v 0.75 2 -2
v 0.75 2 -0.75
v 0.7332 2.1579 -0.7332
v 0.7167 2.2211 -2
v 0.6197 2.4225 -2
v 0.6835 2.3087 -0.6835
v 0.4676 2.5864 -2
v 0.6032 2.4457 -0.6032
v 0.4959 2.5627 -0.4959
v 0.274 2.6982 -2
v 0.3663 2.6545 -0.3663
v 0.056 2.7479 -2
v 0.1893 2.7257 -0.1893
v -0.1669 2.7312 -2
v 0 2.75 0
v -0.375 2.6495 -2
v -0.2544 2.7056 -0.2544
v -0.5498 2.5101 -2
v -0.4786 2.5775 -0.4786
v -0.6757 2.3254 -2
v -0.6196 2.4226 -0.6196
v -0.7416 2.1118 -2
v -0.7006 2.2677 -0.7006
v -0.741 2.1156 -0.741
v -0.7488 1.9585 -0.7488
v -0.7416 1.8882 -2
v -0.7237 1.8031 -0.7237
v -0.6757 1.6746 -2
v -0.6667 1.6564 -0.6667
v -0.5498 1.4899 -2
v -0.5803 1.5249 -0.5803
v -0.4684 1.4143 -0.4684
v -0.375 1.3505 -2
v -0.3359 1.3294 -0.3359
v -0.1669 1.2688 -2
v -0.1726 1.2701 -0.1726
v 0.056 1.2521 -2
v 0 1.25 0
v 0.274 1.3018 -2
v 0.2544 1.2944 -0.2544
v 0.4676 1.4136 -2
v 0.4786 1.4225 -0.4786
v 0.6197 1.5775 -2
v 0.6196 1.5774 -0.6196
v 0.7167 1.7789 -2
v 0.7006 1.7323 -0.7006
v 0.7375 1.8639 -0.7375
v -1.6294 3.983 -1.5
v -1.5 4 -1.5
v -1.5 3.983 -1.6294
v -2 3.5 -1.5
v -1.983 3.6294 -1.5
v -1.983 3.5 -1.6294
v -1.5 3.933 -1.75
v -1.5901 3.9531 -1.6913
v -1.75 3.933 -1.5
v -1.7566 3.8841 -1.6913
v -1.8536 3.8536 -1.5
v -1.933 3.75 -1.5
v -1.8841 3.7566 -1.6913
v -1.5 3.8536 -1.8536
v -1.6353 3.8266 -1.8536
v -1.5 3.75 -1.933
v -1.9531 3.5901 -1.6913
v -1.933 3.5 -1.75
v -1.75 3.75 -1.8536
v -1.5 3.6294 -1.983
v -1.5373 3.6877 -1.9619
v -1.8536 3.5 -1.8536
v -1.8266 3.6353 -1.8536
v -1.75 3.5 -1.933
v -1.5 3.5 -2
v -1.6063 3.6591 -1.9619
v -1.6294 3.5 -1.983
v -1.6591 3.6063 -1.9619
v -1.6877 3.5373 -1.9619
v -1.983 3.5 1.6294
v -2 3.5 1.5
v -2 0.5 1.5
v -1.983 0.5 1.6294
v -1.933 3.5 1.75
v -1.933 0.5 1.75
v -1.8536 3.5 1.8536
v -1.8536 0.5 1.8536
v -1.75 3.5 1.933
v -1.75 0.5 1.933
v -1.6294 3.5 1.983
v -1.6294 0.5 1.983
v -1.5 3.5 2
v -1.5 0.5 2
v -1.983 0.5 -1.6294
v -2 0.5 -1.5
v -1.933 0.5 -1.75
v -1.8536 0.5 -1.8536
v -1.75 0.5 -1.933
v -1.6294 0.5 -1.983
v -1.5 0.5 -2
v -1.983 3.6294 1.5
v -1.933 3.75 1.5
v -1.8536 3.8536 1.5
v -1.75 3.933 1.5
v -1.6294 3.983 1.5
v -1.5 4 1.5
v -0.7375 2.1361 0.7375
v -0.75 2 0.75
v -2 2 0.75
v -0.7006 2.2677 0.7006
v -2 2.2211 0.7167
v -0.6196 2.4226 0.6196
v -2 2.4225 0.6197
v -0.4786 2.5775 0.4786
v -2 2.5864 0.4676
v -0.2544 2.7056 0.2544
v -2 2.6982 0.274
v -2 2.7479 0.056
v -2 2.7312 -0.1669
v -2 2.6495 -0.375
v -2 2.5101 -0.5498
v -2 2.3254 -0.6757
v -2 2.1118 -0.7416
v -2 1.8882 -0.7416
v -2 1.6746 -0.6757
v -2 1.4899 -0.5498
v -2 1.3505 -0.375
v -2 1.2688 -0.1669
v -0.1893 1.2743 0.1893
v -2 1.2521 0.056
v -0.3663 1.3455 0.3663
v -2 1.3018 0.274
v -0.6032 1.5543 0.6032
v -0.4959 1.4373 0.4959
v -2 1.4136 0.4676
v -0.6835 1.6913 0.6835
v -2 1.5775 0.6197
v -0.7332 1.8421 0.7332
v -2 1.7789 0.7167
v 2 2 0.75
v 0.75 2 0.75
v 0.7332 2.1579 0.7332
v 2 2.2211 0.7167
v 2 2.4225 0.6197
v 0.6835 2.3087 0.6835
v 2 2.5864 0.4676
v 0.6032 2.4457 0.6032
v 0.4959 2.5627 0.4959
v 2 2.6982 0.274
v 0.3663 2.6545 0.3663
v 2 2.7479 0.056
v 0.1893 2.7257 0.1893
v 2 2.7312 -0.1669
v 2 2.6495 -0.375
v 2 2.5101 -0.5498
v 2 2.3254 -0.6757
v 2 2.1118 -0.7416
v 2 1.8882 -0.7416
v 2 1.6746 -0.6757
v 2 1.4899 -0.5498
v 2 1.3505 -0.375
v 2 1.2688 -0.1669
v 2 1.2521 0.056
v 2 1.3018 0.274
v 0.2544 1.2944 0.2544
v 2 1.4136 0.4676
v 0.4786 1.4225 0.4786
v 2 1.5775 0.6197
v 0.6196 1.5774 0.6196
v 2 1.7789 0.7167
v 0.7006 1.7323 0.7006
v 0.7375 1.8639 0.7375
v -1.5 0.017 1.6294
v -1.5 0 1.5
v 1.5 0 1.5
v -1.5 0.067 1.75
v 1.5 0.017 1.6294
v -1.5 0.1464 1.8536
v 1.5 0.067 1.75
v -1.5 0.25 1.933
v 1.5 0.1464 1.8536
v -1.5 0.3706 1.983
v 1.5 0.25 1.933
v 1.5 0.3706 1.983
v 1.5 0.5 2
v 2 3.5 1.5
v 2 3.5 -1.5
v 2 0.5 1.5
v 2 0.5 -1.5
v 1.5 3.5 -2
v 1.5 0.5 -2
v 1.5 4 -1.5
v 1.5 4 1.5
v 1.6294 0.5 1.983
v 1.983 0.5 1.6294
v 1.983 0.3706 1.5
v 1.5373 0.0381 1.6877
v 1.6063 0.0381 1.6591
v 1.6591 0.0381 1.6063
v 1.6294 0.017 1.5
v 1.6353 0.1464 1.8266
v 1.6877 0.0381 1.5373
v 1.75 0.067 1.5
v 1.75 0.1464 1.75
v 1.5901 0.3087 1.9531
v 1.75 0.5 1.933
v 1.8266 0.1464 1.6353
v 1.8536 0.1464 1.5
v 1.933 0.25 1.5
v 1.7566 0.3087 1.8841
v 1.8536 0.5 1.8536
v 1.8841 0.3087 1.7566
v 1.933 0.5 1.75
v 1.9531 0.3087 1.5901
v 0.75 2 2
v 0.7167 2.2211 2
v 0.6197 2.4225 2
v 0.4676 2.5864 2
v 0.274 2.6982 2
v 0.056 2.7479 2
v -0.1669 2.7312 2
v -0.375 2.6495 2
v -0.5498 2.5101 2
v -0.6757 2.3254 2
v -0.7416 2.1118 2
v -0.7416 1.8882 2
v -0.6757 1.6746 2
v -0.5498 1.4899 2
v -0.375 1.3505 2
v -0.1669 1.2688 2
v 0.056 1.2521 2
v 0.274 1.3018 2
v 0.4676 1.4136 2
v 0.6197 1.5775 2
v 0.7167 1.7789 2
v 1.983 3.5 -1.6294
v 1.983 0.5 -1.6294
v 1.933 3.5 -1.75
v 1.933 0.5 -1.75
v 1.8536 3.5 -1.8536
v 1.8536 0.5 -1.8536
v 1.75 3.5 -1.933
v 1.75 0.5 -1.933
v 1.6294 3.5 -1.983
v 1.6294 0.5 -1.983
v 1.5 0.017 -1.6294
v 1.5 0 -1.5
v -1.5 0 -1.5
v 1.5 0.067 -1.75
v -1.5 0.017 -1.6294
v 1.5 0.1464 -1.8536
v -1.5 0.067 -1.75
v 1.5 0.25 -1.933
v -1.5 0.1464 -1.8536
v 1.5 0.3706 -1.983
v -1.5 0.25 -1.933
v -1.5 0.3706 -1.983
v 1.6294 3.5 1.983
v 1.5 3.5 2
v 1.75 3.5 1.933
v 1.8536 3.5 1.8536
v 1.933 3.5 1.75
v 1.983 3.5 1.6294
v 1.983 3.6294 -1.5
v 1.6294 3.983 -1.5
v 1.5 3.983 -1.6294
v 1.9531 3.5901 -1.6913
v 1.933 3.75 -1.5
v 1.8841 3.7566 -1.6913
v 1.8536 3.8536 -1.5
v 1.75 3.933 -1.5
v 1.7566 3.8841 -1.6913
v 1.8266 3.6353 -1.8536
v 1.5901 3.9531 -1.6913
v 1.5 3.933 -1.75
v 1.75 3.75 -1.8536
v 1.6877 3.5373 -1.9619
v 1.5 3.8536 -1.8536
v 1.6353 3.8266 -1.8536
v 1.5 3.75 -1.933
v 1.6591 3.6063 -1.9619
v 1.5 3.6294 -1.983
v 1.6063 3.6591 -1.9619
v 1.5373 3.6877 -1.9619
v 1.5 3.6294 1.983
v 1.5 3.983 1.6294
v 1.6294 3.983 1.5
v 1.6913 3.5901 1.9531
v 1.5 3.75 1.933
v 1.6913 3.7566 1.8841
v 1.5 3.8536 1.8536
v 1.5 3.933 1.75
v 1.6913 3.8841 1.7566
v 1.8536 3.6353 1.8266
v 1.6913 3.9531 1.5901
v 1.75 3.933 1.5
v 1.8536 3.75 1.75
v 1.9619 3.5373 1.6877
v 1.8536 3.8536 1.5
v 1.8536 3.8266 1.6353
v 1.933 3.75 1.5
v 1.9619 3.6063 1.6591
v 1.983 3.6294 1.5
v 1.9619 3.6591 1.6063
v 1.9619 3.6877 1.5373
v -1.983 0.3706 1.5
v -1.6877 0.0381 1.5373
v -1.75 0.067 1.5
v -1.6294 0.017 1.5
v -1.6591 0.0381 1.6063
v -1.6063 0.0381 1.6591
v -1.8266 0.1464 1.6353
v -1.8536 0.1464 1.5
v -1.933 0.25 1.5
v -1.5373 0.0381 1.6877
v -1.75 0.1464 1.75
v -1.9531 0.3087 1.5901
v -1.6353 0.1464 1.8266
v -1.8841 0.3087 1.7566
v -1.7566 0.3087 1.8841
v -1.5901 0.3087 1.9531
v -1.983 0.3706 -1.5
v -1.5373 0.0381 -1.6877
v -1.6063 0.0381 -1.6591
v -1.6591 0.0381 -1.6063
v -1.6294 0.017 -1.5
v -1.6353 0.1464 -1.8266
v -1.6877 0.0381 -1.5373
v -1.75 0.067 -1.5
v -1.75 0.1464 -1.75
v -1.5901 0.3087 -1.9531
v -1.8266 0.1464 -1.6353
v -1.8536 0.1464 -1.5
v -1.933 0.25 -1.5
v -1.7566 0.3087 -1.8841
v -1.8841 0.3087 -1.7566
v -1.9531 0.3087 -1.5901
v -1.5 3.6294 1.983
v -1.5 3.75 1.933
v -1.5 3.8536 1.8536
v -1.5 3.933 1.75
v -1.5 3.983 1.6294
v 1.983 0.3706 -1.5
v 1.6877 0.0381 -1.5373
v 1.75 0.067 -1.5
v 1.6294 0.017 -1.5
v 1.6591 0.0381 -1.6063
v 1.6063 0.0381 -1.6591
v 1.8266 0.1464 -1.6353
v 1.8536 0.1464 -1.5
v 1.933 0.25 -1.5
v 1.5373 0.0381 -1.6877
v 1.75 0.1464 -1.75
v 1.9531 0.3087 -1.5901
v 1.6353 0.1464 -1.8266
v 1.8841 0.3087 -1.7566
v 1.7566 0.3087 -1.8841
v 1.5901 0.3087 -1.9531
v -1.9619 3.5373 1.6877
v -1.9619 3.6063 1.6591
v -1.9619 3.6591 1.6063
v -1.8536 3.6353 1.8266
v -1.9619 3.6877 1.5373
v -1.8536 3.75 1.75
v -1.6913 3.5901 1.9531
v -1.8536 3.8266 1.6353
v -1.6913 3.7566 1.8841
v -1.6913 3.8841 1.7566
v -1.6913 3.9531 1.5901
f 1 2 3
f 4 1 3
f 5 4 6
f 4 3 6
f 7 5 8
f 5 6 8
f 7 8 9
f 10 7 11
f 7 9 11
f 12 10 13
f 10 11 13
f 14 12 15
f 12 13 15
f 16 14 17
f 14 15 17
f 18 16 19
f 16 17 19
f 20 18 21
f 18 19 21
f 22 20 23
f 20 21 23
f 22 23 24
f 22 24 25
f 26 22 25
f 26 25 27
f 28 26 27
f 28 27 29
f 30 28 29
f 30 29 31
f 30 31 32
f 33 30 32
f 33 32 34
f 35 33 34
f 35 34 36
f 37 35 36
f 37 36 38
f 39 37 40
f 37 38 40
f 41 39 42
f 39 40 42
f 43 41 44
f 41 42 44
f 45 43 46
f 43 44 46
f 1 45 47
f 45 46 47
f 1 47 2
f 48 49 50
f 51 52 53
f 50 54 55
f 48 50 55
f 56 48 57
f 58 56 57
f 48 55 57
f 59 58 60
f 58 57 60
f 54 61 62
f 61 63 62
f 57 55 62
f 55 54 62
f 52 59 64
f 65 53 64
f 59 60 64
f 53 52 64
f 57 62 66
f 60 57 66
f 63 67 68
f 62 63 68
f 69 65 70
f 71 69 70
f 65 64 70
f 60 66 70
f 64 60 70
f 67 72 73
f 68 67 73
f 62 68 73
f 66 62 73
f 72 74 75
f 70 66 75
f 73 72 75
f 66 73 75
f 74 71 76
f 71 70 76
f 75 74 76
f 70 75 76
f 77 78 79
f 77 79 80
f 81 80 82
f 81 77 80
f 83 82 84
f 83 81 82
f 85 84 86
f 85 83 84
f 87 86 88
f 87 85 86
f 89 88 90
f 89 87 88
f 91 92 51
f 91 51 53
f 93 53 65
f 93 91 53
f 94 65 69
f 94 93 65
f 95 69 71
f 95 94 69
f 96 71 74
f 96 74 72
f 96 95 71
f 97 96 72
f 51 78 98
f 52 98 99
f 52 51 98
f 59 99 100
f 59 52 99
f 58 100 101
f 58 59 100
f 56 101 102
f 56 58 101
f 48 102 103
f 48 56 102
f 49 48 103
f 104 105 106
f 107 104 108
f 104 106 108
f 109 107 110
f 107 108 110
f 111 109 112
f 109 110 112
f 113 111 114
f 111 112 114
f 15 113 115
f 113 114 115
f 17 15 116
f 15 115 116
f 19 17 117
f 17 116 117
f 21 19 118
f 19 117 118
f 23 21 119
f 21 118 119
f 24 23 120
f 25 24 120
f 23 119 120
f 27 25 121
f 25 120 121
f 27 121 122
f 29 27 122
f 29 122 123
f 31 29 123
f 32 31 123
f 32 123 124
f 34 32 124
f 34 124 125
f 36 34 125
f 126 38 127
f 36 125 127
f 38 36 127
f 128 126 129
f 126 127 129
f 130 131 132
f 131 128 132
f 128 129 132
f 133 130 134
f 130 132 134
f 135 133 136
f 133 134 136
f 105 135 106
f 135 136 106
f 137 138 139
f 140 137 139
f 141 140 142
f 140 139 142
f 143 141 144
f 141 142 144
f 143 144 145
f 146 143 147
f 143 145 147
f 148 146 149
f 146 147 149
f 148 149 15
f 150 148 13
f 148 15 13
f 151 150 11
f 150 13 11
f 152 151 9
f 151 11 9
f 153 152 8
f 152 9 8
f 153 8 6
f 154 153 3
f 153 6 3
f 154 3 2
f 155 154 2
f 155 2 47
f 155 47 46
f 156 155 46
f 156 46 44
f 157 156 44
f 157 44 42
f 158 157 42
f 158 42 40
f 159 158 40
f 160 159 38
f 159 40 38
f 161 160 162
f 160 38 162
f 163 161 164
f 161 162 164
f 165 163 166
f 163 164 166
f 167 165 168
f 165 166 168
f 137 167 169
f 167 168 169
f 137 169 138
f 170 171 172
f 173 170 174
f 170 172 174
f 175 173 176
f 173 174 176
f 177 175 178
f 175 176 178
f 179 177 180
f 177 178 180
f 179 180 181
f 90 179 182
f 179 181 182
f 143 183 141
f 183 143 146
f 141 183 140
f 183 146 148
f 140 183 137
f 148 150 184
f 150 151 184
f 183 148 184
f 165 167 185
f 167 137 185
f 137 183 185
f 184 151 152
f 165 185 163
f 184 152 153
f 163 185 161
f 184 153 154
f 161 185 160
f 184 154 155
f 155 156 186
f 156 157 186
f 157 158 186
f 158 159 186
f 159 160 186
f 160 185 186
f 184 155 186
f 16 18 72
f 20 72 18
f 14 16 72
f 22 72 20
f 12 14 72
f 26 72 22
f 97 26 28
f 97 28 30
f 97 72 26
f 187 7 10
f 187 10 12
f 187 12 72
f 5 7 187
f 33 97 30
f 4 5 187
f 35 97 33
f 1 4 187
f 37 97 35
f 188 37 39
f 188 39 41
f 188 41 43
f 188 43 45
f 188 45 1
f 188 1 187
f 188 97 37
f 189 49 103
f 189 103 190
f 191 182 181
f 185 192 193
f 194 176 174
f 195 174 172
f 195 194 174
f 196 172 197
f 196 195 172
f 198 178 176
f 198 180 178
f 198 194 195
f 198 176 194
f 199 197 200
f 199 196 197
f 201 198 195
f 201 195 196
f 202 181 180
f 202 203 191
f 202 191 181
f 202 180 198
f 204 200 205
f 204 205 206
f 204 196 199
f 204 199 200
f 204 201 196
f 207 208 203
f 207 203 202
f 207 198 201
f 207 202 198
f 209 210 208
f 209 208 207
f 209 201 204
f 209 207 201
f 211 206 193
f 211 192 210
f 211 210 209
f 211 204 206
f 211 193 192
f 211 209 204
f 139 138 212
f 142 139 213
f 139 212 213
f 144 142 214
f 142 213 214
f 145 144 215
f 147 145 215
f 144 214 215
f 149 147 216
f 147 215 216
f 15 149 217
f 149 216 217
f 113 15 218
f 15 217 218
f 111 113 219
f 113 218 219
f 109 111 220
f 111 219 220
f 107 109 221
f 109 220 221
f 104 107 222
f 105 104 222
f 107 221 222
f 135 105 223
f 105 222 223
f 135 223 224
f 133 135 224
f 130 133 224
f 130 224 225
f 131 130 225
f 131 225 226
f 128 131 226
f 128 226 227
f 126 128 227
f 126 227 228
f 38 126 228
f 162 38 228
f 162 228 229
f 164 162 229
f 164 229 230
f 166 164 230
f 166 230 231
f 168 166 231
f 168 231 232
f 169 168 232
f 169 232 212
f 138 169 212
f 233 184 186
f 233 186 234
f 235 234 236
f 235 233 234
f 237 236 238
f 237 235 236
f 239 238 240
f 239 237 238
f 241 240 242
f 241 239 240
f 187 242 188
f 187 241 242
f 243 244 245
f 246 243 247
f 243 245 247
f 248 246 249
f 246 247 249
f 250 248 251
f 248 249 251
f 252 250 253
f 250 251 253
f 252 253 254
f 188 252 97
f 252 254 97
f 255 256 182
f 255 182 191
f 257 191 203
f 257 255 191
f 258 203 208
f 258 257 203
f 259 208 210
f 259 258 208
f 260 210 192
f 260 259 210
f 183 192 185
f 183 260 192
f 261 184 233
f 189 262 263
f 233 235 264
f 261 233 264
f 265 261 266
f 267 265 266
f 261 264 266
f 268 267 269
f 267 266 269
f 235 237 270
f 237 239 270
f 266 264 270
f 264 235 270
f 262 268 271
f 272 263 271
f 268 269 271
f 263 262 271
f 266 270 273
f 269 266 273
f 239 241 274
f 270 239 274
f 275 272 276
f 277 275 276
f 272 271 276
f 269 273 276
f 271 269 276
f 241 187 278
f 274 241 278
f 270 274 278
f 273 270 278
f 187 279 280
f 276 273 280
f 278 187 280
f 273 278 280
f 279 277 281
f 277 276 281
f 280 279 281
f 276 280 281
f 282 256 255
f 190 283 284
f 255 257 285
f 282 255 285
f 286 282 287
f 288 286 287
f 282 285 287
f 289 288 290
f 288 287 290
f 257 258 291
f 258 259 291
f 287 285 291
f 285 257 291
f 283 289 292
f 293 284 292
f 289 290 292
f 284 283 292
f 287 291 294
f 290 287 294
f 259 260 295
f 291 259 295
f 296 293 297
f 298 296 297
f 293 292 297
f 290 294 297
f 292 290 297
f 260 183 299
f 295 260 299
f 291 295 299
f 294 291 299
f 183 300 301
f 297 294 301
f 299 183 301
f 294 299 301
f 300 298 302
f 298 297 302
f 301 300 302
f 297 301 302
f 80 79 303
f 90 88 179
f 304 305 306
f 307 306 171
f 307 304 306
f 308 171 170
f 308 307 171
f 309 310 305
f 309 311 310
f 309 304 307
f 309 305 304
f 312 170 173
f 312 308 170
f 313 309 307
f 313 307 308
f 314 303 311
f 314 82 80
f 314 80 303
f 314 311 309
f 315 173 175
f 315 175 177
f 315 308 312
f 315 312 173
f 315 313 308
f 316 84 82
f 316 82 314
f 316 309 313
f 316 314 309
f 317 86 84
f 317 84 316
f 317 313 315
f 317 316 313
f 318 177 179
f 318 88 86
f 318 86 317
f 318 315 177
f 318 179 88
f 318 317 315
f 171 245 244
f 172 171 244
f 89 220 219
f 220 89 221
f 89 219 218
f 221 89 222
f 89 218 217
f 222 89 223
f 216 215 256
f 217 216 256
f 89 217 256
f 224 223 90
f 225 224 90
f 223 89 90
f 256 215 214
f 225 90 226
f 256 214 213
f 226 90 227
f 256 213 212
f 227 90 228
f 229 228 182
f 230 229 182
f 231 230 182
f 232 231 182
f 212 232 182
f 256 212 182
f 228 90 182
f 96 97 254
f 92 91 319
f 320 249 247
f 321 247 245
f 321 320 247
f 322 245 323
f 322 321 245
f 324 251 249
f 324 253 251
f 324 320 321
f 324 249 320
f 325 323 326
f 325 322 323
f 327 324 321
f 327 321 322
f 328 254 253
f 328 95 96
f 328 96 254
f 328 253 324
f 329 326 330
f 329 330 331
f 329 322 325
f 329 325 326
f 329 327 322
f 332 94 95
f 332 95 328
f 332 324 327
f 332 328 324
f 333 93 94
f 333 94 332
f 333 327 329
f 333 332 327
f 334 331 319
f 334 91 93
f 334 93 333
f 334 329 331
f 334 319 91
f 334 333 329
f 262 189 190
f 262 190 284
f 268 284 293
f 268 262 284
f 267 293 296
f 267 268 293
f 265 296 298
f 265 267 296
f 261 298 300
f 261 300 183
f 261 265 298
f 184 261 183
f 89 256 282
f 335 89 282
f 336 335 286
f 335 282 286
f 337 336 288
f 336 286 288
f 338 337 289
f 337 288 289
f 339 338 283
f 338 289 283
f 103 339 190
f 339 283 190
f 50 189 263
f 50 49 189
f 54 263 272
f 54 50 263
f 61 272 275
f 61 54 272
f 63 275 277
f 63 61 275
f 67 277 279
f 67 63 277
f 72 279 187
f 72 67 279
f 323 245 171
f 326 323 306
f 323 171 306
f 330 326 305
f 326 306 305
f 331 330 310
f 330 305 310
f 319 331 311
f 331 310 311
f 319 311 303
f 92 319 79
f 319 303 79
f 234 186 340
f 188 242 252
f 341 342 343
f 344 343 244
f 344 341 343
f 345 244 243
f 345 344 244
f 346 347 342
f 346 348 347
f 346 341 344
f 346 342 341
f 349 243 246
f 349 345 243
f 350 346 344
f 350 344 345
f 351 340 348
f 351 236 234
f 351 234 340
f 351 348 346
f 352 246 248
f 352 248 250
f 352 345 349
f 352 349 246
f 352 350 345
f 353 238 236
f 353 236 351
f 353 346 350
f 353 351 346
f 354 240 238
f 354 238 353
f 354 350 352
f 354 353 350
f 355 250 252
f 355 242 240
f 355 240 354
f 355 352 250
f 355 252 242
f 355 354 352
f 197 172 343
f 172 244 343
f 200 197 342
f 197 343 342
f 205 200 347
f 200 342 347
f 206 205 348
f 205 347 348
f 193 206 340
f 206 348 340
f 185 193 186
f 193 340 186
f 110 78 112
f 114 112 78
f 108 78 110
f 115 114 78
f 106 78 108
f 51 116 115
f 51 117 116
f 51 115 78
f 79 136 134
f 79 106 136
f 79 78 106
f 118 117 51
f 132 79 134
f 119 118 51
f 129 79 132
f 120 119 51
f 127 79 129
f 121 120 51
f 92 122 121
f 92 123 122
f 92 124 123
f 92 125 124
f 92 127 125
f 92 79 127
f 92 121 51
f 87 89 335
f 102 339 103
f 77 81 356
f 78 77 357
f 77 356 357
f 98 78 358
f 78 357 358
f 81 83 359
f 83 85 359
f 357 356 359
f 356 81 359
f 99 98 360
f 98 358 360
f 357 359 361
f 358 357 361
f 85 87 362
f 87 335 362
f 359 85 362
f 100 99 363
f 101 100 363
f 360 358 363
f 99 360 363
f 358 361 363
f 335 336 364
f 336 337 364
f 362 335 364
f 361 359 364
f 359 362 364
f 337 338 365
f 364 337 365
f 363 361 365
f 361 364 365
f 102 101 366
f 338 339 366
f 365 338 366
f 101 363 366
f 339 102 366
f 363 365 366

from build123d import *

# Parameters (mm, degrees)
SKETCH_1_W          = 4
SKETCH_1_H          = 4
EXTRUDE_1_DEPTH     = 4
FILLET_1_R          = 0.5
FILLET_2_R          = 0.5
FILLET_3_R          = 0.5
FILLET_4_R          = 0.5
FILLET_5_R          = 0.5
CUT_EXTRUDE_1_REACH = 8
SKETCH_2_R          = 0.75
SKETCH_3_R          = 0.75
CUT_EXTRUDE_2_DEPTH = 4


with BuildPart() as part:
    # 草图1 → 凸台-拉伸1 (new body)
    with BuildSketch(Plane(origin=(0, 0, 0), x_dir=(1, 0, 0), z_dir=(0, 1, 0))):
        Rectangle(SKETCH_1_W, SKETCH_1_H)
    extrude(amount=EXTRUDE_1_DEPTH)

    # 圆角1
    fillet_1_edges = [part.edges().sort_by_distance(p)[0] for p in [
        (0, 4, 2),
    ]]
    fillet(fillet_1_edges, radius=FILLET_1_R)

    # 圆角2
    fillet_2_edges = [part.edges().sort_by_distance(p)[0] for p in [
        (2, 4, -0.25),
        (2, 1.75, 2),
        (2, 3.853553391, 1.853553391),
    ]]
    fillet(fillet_2_edges, radius=FILLET_2_R)

    # 圆角3
    fillet_3_edges = [part.edges().sort_by_distance(p)[0] for p in [
        (-2, 4, -0.25),
        (-2, 1.75, 2),
        (-2, 3.853553391, 1.853553391),
    ]]
    fillet(fillet_3_edges, radius=FILLET_3_R)

    # 圆角4
    fillet_4_edges = [part.edges().sort_by_distance(p)[0] for p in [
        (2, 1.75, -2),
        (0, 4, -2),
        (1.853553391, 3.853553391, -2),
        (-2, 1.75, -2),
        (-1.853553391, 3.853553391, -2),
    ]]
    fillet(fillet_4_edges, radius=FILLET_4_R)

    # 圆角5
    fillet_5_edges = [part.edges().sort_by_distance(p)[0] for p in [
        (2, 0, 0),
        (1.853553391, 0, 1.853553391),
        (0, 0, 2),
        (-1.853553391, 0, 1.853553391),
        (0, 0, -2),
        (-2, 0, 0),
        (-1.853553391, 0, -1.853553391),
        (1.853553391, 0, -1.853553391),
    ]]
    fillet(fillet_5_edges, radius=FILLET_5_R)

    # 草图2 → 切除-拉伸1 (cut, up to next)
    with BuildSketch(Plane.XY.offset(2), mode=Mode.PRIVATE) as cut_extrude_1_sk1:
        with Locations((0, 2)):
            Circle(SKETCH_2_R)
    cut_extrude_1_tool1 = extrude(cut_extrude_1_sk1.sketch, amount=-CUT_EXTRUDE_1_REACH, mode=Mode.PRIVATE) & part.part
    add(cut_extrude_1_tool1.solids().sort_by_distance((0, 2, 2))[0], mode=Mode.SUBTRACT)

    # 草图3 → 切除-拉伸2 (cut)
    with BuildSketch(Plane.ZY.offset(2)):
        with Locations((0, 2)):
            Circle(SKETCH_3_R)
    extrude(amount=-CUT_EXTRUDE_2_DEPTH, mode=Mode.SUBTRACT)


solid = part.part
